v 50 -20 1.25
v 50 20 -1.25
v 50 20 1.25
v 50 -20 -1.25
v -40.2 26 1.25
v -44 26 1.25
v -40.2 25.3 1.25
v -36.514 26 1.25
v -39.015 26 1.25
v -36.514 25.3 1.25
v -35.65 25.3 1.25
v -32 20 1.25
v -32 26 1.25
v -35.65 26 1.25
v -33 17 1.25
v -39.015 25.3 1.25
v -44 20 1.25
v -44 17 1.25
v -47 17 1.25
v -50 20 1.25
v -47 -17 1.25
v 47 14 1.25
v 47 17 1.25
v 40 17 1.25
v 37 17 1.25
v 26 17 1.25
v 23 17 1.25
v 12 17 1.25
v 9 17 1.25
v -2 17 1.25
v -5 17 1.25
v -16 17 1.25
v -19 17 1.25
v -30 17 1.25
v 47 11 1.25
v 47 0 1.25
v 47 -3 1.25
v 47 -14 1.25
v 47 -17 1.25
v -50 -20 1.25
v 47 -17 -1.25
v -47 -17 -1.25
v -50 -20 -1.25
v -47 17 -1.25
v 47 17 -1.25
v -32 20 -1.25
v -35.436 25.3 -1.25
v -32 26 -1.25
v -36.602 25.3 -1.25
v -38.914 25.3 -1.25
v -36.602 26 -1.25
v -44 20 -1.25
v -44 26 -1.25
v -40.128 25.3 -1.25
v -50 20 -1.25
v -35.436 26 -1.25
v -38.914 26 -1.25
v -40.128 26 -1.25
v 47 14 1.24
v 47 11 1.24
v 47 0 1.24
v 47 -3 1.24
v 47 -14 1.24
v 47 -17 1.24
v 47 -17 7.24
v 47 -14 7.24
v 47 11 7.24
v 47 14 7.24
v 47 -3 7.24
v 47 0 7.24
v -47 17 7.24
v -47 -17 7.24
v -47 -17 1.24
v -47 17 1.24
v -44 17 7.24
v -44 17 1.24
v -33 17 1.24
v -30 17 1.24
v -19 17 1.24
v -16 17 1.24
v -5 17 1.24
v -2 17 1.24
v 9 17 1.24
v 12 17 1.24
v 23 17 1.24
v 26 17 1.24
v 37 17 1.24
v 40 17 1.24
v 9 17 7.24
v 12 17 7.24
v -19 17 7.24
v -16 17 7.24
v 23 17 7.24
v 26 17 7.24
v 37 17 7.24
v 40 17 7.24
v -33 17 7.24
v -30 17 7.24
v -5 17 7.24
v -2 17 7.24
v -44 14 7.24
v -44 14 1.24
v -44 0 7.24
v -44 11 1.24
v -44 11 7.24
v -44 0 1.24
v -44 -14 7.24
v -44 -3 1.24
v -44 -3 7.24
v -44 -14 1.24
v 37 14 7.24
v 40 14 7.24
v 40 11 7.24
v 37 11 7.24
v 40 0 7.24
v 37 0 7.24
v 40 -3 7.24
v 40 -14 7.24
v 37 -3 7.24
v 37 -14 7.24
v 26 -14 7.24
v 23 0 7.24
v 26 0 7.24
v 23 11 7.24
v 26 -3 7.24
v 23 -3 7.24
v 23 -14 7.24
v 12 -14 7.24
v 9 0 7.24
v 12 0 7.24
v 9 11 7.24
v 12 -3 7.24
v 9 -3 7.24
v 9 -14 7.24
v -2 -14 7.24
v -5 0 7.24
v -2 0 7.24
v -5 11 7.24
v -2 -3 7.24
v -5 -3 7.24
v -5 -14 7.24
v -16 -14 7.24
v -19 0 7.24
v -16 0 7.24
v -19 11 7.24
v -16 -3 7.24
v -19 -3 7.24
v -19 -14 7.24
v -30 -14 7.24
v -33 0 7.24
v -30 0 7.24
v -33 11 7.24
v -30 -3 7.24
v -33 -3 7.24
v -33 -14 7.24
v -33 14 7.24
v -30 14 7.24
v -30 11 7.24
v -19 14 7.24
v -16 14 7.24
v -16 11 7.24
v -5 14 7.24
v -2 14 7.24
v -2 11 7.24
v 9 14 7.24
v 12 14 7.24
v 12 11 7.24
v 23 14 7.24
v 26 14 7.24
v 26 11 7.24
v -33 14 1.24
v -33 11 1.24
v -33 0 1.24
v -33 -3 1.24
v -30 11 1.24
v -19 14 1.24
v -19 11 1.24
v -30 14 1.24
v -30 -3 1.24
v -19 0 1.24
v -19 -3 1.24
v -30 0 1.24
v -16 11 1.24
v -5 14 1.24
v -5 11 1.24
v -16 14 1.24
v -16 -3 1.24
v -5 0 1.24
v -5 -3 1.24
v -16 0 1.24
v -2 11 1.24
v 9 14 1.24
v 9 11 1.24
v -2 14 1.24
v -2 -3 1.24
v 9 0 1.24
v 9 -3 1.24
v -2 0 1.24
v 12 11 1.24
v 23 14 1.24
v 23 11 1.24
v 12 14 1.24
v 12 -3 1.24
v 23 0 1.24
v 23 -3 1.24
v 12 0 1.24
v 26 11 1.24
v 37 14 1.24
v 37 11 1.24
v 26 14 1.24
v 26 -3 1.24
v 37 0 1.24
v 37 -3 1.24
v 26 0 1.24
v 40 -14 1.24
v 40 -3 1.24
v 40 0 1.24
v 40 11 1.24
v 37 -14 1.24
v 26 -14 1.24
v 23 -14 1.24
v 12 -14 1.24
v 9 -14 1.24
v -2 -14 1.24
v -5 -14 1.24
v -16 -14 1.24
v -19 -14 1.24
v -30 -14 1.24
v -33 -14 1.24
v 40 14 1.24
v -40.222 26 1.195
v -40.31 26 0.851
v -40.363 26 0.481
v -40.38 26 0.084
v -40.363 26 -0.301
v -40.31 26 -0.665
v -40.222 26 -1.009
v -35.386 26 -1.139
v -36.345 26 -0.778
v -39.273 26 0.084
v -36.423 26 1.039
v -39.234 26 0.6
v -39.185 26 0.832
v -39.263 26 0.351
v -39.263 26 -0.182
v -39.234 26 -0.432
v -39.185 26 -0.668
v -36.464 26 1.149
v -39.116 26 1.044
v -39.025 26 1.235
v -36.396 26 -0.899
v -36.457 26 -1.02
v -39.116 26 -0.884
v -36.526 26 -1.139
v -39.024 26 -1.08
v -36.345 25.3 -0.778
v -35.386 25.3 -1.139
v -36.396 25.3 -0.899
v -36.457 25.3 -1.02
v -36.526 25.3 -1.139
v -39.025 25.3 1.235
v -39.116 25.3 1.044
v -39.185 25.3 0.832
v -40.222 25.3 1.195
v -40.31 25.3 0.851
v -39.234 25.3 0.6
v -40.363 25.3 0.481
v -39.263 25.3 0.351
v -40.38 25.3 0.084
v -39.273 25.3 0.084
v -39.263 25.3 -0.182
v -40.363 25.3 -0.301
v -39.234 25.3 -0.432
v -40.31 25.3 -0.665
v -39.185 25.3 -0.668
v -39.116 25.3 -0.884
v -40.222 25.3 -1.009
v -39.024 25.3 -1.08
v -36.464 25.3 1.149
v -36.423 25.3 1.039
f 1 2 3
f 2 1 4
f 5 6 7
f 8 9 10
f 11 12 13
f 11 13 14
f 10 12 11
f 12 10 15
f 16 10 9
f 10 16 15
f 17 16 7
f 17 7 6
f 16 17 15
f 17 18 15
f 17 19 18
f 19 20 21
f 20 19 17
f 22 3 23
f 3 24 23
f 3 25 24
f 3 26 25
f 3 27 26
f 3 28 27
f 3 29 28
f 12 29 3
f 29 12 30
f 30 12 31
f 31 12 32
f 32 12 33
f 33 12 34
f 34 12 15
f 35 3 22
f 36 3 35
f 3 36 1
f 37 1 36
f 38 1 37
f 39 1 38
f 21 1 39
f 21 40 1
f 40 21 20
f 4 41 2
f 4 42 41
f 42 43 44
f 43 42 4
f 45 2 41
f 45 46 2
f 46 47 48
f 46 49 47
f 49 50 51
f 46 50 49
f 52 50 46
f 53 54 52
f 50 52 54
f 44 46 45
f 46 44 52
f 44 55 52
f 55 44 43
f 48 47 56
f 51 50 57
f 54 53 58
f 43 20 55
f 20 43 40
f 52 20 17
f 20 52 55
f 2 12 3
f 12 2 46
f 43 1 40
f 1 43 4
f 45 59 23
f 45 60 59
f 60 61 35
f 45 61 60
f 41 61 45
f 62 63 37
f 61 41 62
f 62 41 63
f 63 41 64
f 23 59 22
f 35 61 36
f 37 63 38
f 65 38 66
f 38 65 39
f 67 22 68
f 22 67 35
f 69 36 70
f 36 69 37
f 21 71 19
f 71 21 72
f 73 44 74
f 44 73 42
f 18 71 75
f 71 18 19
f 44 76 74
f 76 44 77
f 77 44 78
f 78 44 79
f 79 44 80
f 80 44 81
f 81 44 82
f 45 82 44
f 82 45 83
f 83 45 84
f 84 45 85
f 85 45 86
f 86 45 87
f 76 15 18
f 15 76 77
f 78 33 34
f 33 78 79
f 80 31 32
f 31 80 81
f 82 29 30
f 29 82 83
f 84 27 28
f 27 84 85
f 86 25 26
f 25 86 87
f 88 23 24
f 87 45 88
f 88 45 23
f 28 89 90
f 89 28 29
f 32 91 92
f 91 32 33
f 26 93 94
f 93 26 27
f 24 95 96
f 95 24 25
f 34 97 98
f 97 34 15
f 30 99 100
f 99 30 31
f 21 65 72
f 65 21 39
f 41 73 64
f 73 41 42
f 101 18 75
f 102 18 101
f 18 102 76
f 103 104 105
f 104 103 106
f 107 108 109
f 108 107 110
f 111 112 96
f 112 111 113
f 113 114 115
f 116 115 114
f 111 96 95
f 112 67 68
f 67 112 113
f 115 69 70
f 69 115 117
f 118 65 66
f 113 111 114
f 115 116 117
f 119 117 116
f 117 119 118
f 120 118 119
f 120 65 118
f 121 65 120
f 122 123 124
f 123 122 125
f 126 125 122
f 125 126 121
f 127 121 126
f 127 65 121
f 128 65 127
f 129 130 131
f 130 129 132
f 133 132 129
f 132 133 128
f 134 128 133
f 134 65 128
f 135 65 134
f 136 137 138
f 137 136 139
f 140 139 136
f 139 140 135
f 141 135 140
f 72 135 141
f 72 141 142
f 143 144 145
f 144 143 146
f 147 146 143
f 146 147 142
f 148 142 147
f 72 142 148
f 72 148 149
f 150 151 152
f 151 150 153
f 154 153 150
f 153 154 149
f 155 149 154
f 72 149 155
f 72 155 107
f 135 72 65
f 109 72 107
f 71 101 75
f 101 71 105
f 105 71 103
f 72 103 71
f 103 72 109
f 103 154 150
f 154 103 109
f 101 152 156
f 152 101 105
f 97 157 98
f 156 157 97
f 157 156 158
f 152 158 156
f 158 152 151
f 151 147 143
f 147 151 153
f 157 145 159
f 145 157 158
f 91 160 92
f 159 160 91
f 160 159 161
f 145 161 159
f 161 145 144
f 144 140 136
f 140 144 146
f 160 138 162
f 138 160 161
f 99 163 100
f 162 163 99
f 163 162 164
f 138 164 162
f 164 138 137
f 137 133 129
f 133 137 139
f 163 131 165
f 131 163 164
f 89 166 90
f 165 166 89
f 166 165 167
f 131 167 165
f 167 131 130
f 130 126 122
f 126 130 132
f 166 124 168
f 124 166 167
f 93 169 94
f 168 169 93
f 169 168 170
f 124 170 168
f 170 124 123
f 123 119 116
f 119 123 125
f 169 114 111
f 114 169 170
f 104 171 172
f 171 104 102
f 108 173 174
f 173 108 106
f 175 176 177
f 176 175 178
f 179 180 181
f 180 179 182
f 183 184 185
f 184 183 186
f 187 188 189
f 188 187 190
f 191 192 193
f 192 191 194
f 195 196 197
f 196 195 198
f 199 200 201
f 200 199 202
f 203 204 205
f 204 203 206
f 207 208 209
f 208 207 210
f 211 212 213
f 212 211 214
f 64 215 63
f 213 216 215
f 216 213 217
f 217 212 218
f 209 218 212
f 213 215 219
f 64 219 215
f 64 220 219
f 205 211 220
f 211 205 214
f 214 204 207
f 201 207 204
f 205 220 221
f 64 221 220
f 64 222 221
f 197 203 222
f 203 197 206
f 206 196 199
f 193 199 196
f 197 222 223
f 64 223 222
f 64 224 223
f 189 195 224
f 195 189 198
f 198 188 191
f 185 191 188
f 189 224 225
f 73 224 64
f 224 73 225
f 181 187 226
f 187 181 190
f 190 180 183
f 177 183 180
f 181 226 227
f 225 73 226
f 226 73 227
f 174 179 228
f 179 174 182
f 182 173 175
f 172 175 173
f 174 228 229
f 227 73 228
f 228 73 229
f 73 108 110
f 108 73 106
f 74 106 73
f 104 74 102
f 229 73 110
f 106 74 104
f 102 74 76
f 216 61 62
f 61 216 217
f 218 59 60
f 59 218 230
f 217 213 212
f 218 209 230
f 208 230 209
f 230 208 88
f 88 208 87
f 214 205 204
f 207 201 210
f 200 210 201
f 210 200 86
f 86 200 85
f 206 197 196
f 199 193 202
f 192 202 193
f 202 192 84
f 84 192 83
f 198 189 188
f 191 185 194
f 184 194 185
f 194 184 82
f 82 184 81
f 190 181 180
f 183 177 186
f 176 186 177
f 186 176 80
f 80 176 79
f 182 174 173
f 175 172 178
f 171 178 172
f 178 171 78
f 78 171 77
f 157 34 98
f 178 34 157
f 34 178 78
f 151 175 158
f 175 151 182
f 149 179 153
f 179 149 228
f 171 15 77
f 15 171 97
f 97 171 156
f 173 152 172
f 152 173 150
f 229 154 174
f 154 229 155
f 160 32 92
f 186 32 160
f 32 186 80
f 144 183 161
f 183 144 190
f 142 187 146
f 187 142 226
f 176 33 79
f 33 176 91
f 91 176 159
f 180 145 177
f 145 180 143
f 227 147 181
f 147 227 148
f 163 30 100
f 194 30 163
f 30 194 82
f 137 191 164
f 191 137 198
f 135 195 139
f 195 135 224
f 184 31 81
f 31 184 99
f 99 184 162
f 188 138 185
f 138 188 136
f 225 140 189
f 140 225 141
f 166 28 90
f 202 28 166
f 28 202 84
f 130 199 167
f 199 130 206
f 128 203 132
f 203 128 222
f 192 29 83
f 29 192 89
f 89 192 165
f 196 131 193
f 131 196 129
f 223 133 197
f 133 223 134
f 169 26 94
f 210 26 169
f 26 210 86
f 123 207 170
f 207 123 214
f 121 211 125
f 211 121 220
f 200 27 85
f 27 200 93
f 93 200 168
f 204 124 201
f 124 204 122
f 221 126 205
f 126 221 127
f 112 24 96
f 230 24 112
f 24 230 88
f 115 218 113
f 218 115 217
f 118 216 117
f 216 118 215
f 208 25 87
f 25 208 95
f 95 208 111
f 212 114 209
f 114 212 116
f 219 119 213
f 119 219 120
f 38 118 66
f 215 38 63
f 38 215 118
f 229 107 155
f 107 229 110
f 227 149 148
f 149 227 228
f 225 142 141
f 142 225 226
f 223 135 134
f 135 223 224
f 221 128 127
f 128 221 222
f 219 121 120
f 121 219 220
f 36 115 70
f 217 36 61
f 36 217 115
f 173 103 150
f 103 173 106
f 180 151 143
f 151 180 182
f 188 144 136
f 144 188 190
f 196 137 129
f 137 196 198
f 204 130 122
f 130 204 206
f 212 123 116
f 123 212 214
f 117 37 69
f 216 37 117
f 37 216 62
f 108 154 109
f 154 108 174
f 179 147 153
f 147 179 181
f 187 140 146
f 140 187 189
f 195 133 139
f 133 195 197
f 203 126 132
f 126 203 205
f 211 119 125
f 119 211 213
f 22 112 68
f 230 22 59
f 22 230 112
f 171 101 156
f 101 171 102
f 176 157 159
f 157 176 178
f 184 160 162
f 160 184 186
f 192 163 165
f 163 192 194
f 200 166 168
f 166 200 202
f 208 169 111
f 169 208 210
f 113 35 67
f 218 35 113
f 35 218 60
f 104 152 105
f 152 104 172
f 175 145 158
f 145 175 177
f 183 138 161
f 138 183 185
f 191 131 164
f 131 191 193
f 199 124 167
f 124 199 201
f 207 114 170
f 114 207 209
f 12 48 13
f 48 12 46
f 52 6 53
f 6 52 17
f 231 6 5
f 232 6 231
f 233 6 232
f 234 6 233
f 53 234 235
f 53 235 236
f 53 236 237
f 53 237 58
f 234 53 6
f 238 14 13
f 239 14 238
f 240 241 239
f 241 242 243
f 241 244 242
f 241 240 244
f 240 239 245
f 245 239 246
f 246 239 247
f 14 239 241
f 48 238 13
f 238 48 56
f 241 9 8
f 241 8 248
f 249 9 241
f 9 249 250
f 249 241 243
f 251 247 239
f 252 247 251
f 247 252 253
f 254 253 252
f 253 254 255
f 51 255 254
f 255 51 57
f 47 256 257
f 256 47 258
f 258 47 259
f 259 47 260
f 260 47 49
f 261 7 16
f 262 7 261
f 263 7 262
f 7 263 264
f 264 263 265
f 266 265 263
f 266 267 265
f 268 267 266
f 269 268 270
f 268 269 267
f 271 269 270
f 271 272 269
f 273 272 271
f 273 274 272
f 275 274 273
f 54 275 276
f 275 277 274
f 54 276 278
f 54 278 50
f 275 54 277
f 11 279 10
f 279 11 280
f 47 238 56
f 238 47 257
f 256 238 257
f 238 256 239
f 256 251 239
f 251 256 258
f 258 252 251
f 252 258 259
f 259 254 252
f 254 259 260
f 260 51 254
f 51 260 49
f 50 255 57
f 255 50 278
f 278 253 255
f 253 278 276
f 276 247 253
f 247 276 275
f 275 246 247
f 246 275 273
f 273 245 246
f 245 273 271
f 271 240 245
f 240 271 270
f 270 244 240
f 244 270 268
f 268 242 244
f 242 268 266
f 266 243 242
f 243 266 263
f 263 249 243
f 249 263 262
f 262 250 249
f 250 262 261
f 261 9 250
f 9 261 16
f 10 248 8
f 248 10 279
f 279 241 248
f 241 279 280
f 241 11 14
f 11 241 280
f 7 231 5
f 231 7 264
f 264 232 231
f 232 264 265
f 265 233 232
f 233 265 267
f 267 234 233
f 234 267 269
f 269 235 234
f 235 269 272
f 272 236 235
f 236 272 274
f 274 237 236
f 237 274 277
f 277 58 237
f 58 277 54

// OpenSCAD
// file: helpers.scad
// Shared 2D helpers used by wedge.scad, base.scad and lid.scad.

// Big half-plane (y >= 0), used to build angle masks. `big` just has to be
// larger than any radius used in the design.
module halfplane(big = 2000) {
    translate([-big/2, 0]) square([big, big]);
}

// An angular mask covering [-a/2, +a/2], built as the intersection of two
// half-planes rather than an origin-apex polygon: a sector polygon with its
// point pinned exactly at (0,0) tends to produce a self-touching ("bowtie")
// result once differenced against a same-apex sector for the inner radius,
// which extrudes into a non-manifold solid. Two rotated half-planes never
// share that degenerate vertex.
module angle_mask(a) {
    intersection() {
        rotate([0, 0, -a/2]) halfplane();
        rotate([0, 0, a/2 - 180]) halfplane();
    }
}

// A ring slice between radius r1 and r2, angular width a, centered on angle 0.
module ring_slice(r1, r2, a) {
    intersection() {
        difference() {
            circle(r = r2, $fn = 128);
            circle(r = r1, $fn = 128);
        }
        angle_mask(a);
    }
}

// --- Identificazione pezzi: una lettera incisa su ogni pezzo stampato ------
// Vedi la legenda completa (A-O) in assembly-guide.md. Uso: mettere questa
// come ultima operazione di un difference() sul solido del pezzo, dopo tutti
// gli altri fori/tagli. `ztop` è la quota della faccia piatta su cui incidere
// (nel sistema di coordinate locale del pezzo in quel punto); il taglio parte
// 0.8mm sotto e arriva 0.5mm sopra la faccia, apposta più profondo della sola
// incisione per evitare superfici coincidenti (stesso problema di mesh non
// manifold già visto altrove in questo progetto se il taglio si fermasse
// esattamente sulla superficie).
module label_cut(letter, x, y, ztop, depth = 0.8, size = 7) {
    translate([x, y, ztop - depth])
        linear_extrude(height = depth + 0.5)
            text(letter, size = size, halign = "center", valign = "center",
                 font = "Liberation Sans:style=Bold");
}

// Come label_cut, ma per una faccia con normale lungo +Y invece di +Z (il
// caso di front_panel.scad, dove lo spessore del pannello è lungo Y, non
// Z). Stessa tecnica rotate([90,0,0]) verificata per label_tag: senza
// questa versione, label_cut inciderebbe nella direzione sbagliata.
module label_cut_y(letter, x, yface, z, depth = 0.8, size = 7) {
    translate([x, yface + 0.5, z])
        rotate([90, 0, 0])
            linear_extrude(height = depth + 0.5)
                text(letter, size = size, halign = "center", valign = "center",
                     font = "Liberation Sans:style=Bold");
}

// Targhetta autoportante per pezzi troppo sottili per un'incisione diretta
// (griglia, scivolo): un piccolo blocco pieno fuso per unione con un margine
// di sovrapposizione reale nel pezzo esistente (non solo a contatto), con la
// lettera incisa sulla faccia esterna. `w`/`d`/`h` sono le dimensioni del
// blocco lungo X/Y/Z; il chiamante lo posiziona/ruota così che l'estremità
// -Y penetri nel pezzo di `overlap` mm.
module label_tag(letter, w = 12, d = 6, h = 6, overlap = 2.5, depth = 0.7, size = 5.5) {
    difference() {
        translate([-w/2, -overlap, -h/2])
            cube([w, d + overlap, h]);
        // rotate([90,0,0]) manda l'estrusione di testo (di default lungo +Z,
        // faccia a z=0) a un'estrusione lungo -Y con la faccia a y=0 —
        // verificato esportando solo questo taglio e leggendo il bounding box
        // risultante, non a occhio. Traslando quella faccia a y=d+0.5 il
        // taglio arriva da y=d-depth (dentro il blocco) a y=d+0.5 (oltre la
        // faccia esterna a y=d).
        translate([0, d + 0.5, 0])
            rotate([90, 0, 0])
                linear_extrude(height = depth + 0.5)
                    text(letter, size = size, halign = "center", valign = "center",
                         font = "Liberation Sans:style=Bold");
    }
}
// main file
// Griglia di sicurezza — stampa 1x. Va incastrata tra la bocca inferiore
// della tramoggia (hopper.scad) e l'apertura di carico dell'alloggiamento
// (housing.scad): è l'unica cosa che un dito incontra guardando dentro la
// tramoggia, molto più vicina della scanalatura in rotazione.
//
// NON è una certificazione di sicurezza — è un accorgimento ragionevole
// per un progetto domestico: le celle sono più strette del calibro da
// 12mm usato nelle norme macchine (EN ISO 13857) per verificare che un
// dito non passi, e restano comunque più larghe del diametro sigaretta
// per farla cadere. Se costruisci per un contesto con bambini piccoli,
// valuta celle ancora più strette (riduci `cell_gap`) verificando che le
// sigarette continuino a passare con la tramoggia che vibra.
include <params.scad>
include <helpers.scad>

cell_gap  = 11;    // luce libera tra le barre (< probe da 12mm, > cig_d)
bar_w     = 3;      // spessore barra
bar_h     = 6;       // altezza barra (irrigidisce la griglia)
plate_t   = 2.5;     // spessore del bordo/telaio
lip       = 3;        // sporgenza del bordo oltre l'apertura, per l'appoggio

frame_w = hopper_bot_w + 2*lip;
frame_d = hopper_bot_d + 2*lip;

module bars(len_x, len_y, span_x, span_y) {
    pitch = cell_gap + bar_w;
    nx = floor(span_x / pitch);
    ny = floor(span_y / pitch);
    // barre lungo Y (spaziate su X)
    for (i = [0:nx])
        translate([-span_x/2 + i*pitch, 0, 0])
            cube([bar_w, len_y, bar_h], center = true);
    // barre lungo X (spaziate su Y)
    for (j = [0:ny])
        translate([0, -span_y/2 + j*pitch, 0])
            cube([len_x, bar_w, bar_h], center = true);
}

module grille() {
    union() {
        // telaio di appoggio (bordo pieno che si posa tra tramoggia e housing)
        difference() {
            cube([frame_w, frame_d, plate_t], center = true);
            cube([hopper_bot_w, hopper_bot_d, plate_t + 2], center = true);
        }
        // griglia a maglia, centrata sull'apertura utile
        translate([0, 0, plate_t/2 + bar_h/2 - 0.01])
            bars(hopper_bot_w, hopper_bot_d, hopper_bot_w - bar_w, hopper_bot_d - bar_w);
        // Lettera "C" (vedi assembly-guide.md): il telaio è troppo sottile
        // (lip=3mm) per un'incisione diretta, quindi una piccola targhetta
        // sporge dal bordo posteriore, a filo con lo spessore del telaio.
        translate([-38, frame_d/2, 0])
            label_tag("C", h = plate_t);
    }
}

grille();
